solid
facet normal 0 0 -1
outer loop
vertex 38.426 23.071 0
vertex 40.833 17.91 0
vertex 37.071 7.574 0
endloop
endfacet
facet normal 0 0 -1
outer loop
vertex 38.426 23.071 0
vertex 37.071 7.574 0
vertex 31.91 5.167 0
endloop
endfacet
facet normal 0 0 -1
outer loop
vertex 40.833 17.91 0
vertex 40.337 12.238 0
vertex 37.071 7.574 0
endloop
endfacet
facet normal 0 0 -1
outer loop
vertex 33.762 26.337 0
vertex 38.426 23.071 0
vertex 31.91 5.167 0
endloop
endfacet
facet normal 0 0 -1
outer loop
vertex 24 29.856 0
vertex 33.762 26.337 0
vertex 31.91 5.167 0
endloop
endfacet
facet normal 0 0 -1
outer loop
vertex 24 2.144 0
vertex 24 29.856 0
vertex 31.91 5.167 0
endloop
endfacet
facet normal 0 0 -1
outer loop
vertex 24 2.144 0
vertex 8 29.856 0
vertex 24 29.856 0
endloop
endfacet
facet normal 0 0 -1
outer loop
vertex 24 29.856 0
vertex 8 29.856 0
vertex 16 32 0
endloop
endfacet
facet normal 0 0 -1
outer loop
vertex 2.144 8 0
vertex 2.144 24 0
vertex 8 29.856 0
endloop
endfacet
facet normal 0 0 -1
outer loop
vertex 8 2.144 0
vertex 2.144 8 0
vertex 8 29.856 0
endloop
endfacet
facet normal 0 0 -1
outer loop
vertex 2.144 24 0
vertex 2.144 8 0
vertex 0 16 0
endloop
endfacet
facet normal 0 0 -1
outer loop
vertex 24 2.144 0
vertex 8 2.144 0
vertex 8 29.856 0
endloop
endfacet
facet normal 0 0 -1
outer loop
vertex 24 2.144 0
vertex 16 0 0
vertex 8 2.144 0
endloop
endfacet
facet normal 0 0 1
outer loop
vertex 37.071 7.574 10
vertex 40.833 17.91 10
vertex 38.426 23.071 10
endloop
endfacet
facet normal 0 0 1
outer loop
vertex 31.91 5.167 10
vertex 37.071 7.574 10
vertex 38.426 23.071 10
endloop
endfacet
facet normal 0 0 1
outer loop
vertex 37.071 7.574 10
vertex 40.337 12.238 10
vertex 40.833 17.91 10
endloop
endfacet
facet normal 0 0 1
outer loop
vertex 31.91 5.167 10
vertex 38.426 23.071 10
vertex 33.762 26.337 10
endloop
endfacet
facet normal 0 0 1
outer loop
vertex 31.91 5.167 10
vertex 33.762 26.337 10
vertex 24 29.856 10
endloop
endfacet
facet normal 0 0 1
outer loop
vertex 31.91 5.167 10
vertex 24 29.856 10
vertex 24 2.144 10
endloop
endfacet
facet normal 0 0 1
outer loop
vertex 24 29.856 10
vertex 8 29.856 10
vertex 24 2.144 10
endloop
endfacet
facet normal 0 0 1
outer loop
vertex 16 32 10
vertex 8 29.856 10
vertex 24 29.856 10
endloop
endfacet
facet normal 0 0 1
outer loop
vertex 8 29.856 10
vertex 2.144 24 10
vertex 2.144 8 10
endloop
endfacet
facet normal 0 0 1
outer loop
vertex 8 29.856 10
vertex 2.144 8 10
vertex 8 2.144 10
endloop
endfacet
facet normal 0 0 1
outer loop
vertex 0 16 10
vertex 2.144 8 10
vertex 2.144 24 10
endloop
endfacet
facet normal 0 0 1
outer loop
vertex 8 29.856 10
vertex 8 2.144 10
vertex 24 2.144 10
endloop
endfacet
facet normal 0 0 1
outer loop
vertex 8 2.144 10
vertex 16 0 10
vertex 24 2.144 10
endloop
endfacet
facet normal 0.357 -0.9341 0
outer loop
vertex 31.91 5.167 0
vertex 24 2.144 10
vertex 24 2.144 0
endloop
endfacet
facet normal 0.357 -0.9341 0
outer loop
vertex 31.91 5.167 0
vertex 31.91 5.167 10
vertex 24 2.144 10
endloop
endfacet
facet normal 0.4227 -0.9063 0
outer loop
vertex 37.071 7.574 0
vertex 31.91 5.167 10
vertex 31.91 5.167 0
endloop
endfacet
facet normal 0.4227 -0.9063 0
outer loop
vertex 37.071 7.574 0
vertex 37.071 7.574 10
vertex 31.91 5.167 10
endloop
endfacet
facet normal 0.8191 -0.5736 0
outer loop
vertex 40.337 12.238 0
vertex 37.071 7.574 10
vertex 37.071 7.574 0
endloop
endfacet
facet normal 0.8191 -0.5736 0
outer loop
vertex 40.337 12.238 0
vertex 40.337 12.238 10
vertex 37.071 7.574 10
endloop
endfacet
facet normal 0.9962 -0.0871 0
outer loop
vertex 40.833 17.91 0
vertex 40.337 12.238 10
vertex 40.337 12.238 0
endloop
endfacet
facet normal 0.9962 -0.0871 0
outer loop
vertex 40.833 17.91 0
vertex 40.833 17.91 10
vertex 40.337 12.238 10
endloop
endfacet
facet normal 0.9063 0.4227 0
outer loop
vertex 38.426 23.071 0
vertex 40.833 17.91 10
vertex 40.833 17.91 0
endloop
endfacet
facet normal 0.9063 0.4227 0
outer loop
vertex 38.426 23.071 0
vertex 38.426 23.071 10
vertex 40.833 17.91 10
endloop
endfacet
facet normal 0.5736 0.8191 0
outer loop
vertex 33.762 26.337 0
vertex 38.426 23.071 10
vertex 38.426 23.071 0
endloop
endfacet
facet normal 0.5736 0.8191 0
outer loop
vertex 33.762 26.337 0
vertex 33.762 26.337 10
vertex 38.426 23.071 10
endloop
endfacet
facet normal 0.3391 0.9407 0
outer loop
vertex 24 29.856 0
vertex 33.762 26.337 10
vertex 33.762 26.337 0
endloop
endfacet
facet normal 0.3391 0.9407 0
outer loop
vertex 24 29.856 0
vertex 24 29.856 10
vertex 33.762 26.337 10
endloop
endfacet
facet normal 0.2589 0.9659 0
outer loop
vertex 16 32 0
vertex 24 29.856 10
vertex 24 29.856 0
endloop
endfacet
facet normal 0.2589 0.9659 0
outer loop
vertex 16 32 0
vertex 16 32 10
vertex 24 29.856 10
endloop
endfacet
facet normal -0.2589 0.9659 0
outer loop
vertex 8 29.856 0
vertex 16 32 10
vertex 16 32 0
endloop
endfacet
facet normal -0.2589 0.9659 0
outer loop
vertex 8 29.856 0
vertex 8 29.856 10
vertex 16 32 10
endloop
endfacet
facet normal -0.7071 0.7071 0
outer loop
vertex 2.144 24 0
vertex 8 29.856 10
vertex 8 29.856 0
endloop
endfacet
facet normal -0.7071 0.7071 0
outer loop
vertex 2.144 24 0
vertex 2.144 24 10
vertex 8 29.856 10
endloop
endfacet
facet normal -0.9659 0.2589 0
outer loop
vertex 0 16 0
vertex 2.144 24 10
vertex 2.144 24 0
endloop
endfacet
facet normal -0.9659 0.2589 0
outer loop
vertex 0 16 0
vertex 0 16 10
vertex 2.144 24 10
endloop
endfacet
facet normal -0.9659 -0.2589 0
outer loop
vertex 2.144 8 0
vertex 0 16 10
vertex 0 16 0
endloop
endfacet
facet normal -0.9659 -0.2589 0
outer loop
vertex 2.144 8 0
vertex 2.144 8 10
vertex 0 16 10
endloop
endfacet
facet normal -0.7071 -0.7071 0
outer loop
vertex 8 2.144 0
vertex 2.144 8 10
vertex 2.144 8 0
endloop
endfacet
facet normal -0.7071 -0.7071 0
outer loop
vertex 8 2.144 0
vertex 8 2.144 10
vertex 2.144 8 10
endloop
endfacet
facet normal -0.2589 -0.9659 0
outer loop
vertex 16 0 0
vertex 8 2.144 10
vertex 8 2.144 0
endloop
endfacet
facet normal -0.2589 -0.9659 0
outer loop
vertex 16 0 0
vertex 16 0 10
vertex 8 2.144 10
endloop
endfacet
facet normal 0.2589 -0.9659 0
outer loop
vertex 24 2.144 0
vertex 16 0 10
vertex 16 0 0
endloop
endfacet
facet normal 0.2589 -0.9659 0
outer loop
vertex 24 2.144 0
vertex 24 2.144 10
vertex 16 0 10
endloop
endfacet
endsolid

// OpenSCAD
$fn = 32;

// ----------------------------------------------------------------------
// Eccentric disc: step, 10 mm thick
// ----------------------------------------------------------------------

// --- parameters (mm) ---
profile_height = 10;      // extrusion height
profile_points = 15;      // points of the closed outline

profile = [[0, 16], [2.144, 8], [8, 2.144], [16, 0], [24, 2.144], [31.91, 5.167], [37.071, 7.574], [40.337, 12.238], [40.833, 17.91], [38.426, 23.071], [33.762, 26.337], [24, 29.856], [16, 32], [8, 29.856], [2.144, 24]];  // single closed polygon, 15 points, counter clockwise

// --- the one profile operation ---
linear_extrude(height = profile_height) polygon(points = profile);
